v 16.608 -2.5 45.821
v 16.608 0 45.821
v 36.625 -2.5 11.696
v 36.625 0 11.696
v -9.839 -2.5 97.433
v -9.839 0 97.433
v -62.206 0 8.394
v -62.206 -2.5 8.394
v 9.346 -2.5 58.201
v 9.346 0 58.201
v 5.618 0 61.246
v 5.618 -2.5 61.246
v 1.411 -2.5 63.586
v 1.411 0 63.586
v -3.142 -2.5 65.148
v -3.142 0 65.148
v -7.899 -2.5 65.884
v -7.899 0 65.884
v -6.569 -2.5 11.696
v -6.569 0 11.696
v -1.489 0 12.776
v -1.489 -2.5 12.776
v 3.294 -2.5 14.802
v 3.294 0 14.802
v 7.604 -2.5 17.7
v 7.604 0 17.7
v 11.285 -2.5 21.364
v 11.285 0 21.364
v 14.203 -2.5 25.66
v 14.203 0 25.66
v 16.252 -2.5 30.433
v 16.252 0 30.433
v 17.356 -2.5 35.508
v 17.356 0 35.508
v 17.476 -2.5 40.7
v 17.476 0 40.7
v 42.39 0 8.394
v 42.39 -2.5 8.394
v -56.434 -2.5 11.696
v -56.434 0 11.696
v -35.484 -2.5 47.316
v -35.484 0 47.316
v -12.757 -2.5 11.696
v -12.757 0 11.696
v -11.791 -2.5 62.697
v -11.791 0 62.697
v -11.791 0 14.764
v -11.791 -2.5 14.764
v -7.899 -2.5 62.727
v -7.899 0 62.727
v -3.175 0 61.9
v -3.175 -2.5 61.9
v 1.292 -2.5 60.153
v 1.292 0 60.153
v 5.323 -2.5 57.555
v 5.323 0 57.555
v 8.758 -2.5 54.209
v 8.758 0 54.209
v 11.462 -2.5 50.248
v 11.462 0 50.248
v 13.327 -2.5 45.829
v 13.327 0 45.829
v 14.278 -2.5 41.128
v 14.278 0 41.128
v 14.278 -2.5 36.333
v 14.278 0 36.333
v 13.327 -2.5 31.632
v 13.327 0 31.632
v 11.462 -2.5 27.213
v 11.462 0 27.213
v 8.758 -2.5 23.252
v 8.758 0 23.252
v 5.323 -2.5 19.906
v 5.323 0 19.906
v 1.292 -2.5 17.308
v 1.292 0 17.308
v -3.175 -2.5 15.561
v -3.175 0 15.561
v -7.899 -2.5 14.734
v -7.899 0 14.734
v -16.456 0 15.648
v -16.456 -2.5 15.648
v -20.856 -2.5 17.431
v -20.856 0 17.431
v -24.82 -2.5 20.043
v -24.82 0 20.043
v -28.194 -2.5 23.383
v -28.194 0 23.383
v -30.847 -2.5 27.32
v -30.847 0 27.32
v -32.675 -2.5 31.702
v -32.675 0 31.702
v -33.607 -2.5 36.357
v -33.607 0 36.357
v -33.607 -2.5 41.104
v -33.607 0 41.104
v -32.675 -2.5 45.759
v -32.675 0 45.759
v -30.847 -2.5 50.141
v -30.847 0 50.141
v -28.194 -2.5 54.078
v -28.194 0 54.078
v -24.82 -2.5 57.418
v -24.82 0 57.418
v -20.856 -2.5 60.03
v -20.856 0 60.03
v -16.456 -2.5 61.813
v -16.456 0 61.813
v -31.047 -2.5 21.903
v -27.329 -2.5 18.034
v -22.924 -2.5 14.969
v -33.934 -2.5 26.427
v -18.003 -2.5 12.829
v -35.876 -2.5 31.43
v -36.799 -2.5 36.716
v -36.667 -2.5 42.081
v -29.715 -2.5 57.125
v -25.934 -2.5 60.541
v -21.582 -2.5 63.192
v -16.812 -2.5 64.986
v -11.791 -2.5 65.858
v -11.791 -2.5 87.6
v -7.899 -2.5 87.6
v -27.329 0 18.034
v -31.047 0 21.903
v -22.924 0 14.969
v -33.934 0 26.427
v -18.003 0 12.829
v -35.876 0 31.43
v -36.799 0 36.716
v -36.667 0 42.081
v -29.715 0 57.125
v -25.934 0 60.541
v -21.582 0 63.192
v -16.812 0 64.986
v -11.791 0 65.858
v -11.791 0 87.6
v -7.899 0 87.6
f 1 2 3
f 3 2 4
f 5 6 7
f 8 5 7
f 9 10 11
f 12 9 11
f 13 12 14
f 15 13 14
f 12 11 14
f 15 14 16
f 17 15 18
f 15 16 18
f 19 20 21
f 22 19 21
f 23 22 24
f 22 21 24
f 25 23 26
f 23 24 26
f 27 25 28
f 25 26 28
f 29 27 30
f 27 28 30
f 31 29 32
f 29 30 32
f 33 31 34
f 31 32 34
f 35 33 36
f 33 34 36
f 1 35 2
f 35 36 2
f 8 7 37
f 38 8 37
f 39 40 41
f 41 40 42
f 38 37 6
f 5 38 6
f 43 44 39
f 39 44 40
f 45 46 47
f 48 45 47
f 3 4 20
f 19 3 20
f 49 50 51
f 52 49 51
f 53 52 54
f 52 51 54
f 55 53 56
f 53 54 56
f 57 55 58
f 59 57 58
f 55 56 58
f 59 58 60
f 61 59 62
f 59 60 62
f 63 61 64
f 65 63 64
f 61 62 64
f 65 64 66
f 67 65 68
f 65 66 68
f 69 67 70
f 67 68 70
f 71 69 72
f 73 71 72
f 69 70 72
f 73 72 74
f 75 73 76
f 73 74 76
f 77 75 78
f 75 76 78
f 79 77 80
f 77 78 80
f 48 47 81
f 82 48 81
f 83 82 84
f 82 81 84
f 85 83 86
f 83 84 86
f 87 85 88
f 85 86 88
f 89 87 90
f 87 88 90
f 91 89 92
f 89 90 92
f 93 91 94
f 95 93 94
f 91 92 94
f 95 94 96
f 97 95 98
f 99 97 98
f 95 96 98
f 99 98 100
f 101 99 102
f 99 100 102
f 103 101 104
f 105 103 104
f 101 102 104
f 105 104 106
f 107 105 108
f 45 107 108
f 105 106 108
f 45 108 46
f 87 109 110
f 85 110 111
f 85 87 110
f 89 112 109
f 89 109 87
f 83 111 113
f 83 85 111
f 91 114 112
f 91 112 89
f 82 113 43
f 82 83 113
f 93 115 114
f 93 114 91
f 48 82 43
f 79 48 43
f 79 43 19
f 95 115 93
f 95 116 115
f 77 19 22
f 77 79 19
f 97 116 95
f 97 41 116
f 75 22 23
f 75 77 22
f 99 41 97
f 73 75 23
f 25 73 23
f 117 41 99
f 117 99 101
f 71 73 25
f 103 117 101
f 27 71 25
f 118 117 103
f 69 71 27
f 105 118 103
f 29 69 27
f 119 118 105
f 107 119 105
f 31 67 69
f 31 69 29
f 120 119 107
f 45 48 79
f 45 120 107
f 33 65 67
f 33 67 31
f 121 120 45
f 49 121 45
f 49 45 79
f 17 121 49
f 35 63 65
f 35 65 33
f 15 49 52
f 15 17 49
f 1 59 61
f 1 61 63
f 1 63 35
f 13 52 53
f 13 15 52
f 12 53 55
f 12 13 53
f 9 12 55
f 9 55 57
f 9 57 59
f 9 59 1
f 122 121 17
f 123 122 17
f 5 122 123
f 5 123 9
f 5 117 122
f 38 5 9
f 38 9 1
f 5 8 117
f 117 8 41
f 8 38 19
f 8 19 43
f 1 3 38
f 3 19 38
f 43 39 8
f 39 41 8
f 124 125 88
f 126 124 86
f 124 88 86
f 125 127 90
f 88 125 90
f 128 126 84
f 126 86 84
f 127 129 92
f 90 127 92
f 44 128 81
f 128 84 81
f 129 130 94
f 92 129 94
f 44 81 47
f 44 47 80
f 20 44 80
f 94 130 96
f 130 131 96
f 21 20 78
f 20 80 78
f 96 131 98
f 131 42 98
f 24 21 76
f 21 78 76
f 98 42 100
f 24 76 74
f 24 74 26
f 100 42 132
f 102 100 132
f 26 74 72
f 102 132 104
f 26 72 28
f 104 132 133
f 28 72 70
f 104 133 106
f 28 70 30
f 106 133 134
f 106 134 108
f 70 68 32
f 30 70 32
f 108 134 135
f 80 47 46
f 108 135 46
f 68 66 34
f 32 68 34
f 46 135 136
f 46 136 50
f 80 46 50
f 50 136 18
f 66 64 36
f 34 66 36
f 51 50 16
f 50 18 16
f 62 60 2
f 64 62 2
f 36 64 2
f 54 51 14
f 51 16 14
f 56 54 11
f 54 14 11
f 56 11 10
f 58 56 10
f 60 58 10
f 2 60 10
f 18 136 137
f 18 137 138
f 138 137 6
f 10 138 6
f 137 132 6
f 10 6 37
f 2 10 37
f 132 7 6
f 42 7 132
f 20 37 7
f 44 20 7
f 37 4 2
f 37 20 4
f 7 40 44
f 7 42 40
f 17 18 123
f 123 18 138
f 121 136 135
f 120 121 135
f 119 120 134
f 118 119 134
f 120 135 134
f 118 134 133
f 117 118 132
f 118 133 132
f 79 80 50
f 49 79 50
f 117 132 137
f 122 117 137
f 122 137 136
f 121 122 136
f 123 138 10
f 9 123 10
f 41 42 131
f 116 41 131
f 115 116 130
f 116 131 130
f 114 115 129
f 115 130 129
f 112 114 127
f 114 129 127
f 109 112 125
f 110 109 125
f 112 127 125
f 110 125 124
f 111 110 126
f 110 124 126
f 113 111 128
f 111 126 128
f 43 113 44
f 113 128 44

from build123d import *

# Parameters (mm, degrees)
F1_DEPTH = 2.5


with BuildPart() as f1:
    # F0 (on Front) → F1 (new body)
    with BuildSketch(Plane.XZ):
        Polygon((42.389926, 8.394053), (-9.838827, 97.432958), (-62.206484, 8.394053), align=None)
        Polygon((16.607858, 45.820797), (36.624869, 11.696054), (-6.56895, 11.696054), (-7.898982, 11.696054), (-11.791403, 11.696054), (-12.757268, 11.696054), (-56.433667, 11.696054), (-35.484269, 47.315586), (-29.714779, 57.12525), (-11.791403, 87.599742), (-9.842608, 90.91321), (-7.898982, 87.599742), (9.345976, 58.20076), align=None, mode=Mode.SUBTRACT)
        with BuildLine():
            Line((-12.757268, 11.696054), (-11.791403, 11.696054))
            Line((-11.791403, 11.696054), (-11.791403, 14.763876))
            ThreePointArc((-11.791403, 14.763876), (-33.72406, 38.730513), (-11.791403, 62.697151))
            Line((-11.791403, 62.697151), (-11.791403, 65.858104))
            ThreePointArc((-11.791403, 65.858104), (-21.581724, 63.19237), (-29.714779, 57.12525))
            Line((-29.714779, 57.12525), (-35.484269, 47.315586))
            ThreePointArc((-35.484269, 47.315586), (-32.602413, 24.094116), (-12.757268, 11.696054))
        make_face()
        Polygon((-11.791403, 11.696054), (-7.898982, 11.696054), (-7.898982, 14.734322), (-7.898982, 62.726705), (-7.898982, 65.884218), (-7.898982, 87.599742), (-9.842608, 90.91321), (-11.791403, 87.599742), (-11.791403, 65.858104), (-11.791403, 62.697151), (-11.791403, 14.763876), align=None)
        with BuildLine():
            ThreePointArc((-6.56895, 11.696054), (12.846937, 23.442164), (16.607858, 45.820797))
            Line((16.607858, 45.820797), (9.345976, 58.20076))
            ThreePointArc((9.345976, 58.20076), (1.411206, 63.586003), (-7.898982, 65.884218))
            Line((-7.898982, 65.884218), (-7.898982, 62.726705))
            ThreePointArc((-7.898982, 62.726705), (14.397842, 38.730513), (-7.898982, 14.734322))
            Line((-7.898982, 14.734322), (-7.898982, 11.696054))
            Line((-7.898982, 11.696054), (-6.56895, 11.696054))
        make_face()
    extrude(amount=F1_DEPTH)


solid = f1.part
